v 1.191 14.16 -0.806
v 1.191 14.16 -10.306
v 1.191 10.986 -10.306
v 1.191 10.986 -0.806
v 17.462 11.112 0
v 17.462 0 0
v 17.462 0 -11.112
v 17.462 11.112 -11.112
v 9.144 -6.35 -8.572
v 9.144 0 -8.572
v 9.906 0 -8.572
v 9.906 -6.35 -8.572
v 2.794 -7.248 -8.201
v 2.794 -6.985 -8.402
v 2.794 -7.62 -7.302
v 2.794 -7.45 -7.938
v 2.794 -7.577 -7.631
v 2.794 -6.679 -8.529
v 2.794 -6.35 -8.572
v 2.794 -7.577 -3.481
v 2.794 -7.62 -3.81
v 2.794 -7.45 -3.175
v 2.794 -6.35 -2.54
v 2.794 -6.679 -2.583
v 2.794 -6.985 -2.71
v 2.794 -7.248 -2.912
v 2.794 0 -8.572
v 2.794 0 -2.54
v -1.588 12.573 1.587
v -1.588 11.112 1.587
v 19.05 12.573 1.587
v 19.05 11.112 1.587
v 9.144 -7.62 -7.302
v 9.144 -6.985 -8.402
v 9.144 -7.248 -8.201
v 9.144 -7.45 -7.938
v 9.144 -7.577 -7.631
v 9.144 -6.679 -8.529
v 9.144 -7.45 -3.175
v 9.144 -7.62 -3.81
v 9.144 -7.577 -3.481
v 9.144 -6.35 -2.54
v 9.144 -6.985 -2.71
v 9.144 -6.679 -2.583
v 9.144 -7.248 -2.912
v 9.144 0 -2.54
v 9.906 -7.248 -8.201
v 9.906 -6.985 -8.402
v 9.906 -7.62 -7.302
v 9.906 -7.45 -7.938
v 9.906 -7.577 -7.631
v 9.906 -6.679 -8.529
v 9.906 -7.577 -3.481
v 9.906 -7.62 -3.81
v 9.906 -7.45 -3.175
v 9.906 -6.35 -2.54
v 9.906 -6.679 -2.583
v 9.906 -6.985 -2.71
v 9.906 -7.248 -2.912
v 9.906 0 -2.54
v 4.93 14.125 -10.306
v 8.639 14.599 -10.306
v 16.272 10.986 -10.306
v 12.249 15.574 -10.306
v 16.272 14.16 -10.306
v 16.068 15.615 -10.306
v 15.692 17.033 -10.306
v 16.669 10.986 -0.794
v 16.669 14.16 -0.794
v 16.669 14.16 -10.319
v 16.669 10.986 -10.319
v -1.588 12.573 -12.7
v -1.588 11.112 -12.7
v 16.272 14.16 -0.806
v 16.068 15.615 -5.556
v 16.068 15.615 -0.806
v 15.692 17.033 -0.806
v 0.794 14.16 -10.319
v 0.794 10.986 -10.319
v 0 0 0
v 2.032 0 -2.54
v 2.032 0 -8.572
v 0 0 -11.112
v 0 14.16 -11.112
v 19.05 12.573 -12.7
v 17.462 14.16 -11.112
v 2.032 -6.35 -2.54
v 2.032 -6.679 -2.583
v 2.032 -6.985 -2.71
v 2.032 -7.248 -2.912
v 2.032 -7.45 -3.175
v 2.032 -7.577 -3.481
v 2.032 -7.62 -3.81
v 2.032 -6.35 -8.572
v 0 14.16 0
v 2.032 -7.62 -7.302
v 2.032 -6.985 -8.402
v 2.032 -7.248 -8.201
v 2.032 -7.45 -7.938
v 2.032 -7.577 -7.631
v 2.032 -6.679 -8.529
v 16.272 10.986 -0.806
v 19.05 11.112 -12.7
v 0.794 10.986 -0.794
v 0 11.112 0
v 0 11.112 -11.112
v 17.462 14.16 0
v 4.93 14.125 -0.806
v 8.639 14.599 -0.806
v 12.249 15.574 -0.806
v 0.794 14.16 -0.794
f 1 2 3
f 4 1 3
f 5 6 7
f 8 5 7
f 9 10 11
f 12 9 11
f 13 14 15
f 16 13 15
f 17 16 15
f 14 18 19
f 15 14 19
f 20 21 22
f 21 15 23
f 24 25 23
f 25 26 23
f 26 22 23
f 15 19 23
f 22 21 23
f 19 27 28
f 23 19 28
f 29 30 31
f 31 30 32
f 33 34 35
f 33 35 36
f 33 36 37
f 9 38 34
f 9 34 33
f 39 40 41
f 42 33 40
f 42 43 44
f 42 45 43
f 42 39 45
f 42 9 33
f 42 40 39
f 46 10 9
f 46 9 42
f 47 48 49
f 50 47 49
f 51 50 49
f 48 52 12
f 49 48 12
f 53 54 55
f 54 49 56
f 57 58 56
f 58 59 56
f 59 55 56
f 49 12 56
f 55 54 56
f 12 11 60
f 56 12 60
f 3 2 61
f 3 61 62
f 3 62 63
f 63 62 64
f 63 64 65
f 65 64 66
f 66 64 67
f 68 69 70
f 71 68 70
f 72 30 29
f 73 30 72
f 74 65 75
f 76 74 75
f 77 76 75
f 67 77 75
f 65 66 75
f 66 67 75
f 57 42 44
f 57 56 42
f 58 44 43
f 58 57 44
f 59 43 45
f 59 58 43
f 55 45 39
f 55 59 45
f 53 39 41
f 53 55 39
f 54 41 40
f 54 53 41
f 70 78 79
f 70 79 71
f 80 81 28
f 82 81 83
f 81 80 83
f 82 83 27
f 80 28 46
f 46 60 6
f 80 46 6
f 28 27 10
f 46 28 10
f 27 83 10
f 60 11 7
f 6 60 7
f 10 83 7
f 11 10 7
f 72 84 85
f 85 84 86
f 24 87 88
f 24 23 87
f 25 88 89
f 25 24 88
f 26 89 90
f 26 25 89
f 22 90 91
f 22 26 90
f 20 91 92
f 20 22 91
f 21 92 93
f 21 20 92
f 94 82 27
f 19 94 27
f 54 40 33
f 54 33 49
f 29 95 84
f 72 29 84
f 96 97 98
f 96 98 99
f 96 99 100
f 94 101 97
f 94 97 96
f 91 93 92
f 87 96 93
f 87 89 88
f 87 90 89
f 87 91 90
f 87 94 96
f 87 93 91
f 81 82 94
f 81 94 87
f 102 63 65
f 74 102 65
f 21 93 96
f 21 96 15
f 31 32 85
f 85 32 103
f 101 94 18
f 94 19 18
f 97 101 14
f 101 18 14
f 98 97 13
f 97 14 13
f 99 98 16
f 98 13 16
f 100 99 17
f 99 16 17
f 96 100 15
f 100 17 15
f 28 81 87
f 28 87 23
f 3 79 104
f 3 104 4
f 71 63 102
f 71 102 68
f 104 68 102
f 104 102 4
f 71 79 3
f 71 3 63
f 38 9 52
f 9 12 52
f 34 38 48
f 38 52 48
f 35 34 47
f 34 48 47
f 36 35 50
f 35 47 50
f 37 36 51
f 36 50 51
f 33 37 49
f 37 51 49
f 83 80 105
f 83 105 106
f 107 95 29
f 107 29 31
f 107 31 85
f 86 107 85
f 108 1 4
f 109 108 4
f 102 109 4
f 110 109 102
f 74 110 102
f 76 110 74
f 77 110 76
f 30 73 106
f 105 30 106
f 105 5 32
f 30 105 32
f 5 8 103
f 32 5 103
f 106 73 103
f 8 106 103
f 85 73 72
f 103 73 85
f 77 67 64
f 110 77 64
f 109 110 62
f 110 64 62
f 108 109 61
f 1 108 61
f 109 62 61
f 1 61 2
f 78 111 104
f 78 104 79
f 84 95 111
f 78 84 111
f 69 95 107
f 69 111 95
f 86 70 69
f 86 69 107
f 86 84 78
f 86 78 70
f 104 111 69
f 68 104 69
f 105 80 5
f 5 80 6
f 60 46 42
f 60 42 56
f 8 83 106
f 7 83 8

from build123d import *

# Parameters (mm, degrees)
SKETCH1_W                = 17.4625
SKETCH1_H                = 11.1125
BOSS_EXTRUDE1_DEPTH      = 11.1125
SKETCH2_W                = 20.6375
SKETCH2_H                = 14.2875
BOSS_EXTRUDE2_DEPTH      = 3.048
CHAMFER1_SIZE            = 1.5875
SKETCH3_W                = 15.875
SKETCH3_H                = 9.525
CUT_EXTRUDE1_DEPTH       = 3.175
BOSS_EXTRUDE3_DEPTH      = 4.7498
BOSS_EXTRUDE3_DEPTH_BACK = 4.7498
SKETCH5_W                = 0.762
SKETCH5_H                = 6.0325
BOSS_EXTRUDE4_DEPTH      = 7.62
FILLET1_R                = 1.27


with BuildPart() as part:
    # Sketch1 → Boss-Extrude1 (new body)
    with BuildSketch(Plane(origin=(0, 0, 0), x_dir=(1, 0, 0), z_dir=(0, 1, 0))):
        with Locations((8.73125, 5.55625)):
            Rectangle(SKETCH1_W, SKETCH1_H)
    extrude(amount=BOSS_EXTRUDE1_DEPTH)

    # Sketch2 → Boss-Extrude2 (add)
    with BuildSketch(Plane(origin=(0, 11.1125, 0), x_dir=(1, 0, 0), z_dir=(0, 1, 0))):
        with Locations((8.73125, 5.55625)):
            Rectangle(SKETCH2_W, SKETCH2_H)
    extrude(amount=BOSS_EXTRUDE2_DEPTH)

    # Chamfer1
    chamfer1_edges = [part.edges().sort_by_distance(p)[0] for p in [
        (-1.5875, 14.1605, -5.55625),
        (8.73125, 14.1605, 1.5875),
        (19.05, 14.1605, -5.55625),
        (8.73125, 14.1605, -12.7),
    ]]
    chamfer(chamfer1_edges, length=CHAMFER1_SIZE)

    # Sketch3 → Cut-Extrude1 (cut)
    with BuildSketch(Plane(origin=(0, 14.1605, 0), x_dir=(1, 0, 0), z_dir=(0, 1, 0))):
        with Locations((8.73125, 5.55625)):
            Rectangle(SKETCH3_W, SKETCH3_H)
    extrude(amount=-CUT_EXTRUDE1_DEPTH, mode=Mode.SUBTRACT)

    # Sketch4 → Boss-Extrude3 (add, two sides: drawn at the far end of the back side and taken through both)
    with BuildSketch(Plane.XY.offset(-5.55625).offset(-BOSS_EXTRUDE3_DEPTH_BACK)):
        with BuildLine():
            Line((1.190625, 10.9855), (16.271875, 10.9855))
            Line((16.271875, 10.9855), (16.271875, 14.1605))
            add(Edge.make_bspline(
                [(16.271875, 14.1605), (16.153461698, 15.632290366), (15.692407357, 17.033048026)],
                knots=[0, 0, 0, 1, 1, 1], degree=2))
            ThreePointArc((15.692407357, 17.033048026), (8.639200608, 14.598783188), (1.190625, 14.1605))
            Line((1.190625, 14.1605), (1.190625, 10.9855))
        make_face()
    extrude(amount=BOSS_EXTRUDE3_DEPTH + BOSS_EXTRUDE3_DEPTH_BACK)

    # Sketch5 → Boss-Extrude4 (add)
    with BuildSketch(Plane.XZ):
        with Locations((2.413, -5.55625)):
            Rectangle(SKETCH5_W, SKETCH5_H)
        with Locations((9.525, -5.55625)):
            Rectangle(SKETCH5_W, SKETCH5_H)
    extrude(amount=BOSS_EXTRUDE4_DEPTH)

    # Fillet1
    fillet1_edges = [part.edges().sort_by_distance(p)[0] for p in [
        (2.413, -7.62, -8.5725),
        (2.413, -7.62, -2.54),
        (9.525, -7.62, -8.5725),
        (9.525, -7.62, -2.54),
    ]]
    fillet(fillet1_edges, radius=FILLET1_R)


solid = part.part
